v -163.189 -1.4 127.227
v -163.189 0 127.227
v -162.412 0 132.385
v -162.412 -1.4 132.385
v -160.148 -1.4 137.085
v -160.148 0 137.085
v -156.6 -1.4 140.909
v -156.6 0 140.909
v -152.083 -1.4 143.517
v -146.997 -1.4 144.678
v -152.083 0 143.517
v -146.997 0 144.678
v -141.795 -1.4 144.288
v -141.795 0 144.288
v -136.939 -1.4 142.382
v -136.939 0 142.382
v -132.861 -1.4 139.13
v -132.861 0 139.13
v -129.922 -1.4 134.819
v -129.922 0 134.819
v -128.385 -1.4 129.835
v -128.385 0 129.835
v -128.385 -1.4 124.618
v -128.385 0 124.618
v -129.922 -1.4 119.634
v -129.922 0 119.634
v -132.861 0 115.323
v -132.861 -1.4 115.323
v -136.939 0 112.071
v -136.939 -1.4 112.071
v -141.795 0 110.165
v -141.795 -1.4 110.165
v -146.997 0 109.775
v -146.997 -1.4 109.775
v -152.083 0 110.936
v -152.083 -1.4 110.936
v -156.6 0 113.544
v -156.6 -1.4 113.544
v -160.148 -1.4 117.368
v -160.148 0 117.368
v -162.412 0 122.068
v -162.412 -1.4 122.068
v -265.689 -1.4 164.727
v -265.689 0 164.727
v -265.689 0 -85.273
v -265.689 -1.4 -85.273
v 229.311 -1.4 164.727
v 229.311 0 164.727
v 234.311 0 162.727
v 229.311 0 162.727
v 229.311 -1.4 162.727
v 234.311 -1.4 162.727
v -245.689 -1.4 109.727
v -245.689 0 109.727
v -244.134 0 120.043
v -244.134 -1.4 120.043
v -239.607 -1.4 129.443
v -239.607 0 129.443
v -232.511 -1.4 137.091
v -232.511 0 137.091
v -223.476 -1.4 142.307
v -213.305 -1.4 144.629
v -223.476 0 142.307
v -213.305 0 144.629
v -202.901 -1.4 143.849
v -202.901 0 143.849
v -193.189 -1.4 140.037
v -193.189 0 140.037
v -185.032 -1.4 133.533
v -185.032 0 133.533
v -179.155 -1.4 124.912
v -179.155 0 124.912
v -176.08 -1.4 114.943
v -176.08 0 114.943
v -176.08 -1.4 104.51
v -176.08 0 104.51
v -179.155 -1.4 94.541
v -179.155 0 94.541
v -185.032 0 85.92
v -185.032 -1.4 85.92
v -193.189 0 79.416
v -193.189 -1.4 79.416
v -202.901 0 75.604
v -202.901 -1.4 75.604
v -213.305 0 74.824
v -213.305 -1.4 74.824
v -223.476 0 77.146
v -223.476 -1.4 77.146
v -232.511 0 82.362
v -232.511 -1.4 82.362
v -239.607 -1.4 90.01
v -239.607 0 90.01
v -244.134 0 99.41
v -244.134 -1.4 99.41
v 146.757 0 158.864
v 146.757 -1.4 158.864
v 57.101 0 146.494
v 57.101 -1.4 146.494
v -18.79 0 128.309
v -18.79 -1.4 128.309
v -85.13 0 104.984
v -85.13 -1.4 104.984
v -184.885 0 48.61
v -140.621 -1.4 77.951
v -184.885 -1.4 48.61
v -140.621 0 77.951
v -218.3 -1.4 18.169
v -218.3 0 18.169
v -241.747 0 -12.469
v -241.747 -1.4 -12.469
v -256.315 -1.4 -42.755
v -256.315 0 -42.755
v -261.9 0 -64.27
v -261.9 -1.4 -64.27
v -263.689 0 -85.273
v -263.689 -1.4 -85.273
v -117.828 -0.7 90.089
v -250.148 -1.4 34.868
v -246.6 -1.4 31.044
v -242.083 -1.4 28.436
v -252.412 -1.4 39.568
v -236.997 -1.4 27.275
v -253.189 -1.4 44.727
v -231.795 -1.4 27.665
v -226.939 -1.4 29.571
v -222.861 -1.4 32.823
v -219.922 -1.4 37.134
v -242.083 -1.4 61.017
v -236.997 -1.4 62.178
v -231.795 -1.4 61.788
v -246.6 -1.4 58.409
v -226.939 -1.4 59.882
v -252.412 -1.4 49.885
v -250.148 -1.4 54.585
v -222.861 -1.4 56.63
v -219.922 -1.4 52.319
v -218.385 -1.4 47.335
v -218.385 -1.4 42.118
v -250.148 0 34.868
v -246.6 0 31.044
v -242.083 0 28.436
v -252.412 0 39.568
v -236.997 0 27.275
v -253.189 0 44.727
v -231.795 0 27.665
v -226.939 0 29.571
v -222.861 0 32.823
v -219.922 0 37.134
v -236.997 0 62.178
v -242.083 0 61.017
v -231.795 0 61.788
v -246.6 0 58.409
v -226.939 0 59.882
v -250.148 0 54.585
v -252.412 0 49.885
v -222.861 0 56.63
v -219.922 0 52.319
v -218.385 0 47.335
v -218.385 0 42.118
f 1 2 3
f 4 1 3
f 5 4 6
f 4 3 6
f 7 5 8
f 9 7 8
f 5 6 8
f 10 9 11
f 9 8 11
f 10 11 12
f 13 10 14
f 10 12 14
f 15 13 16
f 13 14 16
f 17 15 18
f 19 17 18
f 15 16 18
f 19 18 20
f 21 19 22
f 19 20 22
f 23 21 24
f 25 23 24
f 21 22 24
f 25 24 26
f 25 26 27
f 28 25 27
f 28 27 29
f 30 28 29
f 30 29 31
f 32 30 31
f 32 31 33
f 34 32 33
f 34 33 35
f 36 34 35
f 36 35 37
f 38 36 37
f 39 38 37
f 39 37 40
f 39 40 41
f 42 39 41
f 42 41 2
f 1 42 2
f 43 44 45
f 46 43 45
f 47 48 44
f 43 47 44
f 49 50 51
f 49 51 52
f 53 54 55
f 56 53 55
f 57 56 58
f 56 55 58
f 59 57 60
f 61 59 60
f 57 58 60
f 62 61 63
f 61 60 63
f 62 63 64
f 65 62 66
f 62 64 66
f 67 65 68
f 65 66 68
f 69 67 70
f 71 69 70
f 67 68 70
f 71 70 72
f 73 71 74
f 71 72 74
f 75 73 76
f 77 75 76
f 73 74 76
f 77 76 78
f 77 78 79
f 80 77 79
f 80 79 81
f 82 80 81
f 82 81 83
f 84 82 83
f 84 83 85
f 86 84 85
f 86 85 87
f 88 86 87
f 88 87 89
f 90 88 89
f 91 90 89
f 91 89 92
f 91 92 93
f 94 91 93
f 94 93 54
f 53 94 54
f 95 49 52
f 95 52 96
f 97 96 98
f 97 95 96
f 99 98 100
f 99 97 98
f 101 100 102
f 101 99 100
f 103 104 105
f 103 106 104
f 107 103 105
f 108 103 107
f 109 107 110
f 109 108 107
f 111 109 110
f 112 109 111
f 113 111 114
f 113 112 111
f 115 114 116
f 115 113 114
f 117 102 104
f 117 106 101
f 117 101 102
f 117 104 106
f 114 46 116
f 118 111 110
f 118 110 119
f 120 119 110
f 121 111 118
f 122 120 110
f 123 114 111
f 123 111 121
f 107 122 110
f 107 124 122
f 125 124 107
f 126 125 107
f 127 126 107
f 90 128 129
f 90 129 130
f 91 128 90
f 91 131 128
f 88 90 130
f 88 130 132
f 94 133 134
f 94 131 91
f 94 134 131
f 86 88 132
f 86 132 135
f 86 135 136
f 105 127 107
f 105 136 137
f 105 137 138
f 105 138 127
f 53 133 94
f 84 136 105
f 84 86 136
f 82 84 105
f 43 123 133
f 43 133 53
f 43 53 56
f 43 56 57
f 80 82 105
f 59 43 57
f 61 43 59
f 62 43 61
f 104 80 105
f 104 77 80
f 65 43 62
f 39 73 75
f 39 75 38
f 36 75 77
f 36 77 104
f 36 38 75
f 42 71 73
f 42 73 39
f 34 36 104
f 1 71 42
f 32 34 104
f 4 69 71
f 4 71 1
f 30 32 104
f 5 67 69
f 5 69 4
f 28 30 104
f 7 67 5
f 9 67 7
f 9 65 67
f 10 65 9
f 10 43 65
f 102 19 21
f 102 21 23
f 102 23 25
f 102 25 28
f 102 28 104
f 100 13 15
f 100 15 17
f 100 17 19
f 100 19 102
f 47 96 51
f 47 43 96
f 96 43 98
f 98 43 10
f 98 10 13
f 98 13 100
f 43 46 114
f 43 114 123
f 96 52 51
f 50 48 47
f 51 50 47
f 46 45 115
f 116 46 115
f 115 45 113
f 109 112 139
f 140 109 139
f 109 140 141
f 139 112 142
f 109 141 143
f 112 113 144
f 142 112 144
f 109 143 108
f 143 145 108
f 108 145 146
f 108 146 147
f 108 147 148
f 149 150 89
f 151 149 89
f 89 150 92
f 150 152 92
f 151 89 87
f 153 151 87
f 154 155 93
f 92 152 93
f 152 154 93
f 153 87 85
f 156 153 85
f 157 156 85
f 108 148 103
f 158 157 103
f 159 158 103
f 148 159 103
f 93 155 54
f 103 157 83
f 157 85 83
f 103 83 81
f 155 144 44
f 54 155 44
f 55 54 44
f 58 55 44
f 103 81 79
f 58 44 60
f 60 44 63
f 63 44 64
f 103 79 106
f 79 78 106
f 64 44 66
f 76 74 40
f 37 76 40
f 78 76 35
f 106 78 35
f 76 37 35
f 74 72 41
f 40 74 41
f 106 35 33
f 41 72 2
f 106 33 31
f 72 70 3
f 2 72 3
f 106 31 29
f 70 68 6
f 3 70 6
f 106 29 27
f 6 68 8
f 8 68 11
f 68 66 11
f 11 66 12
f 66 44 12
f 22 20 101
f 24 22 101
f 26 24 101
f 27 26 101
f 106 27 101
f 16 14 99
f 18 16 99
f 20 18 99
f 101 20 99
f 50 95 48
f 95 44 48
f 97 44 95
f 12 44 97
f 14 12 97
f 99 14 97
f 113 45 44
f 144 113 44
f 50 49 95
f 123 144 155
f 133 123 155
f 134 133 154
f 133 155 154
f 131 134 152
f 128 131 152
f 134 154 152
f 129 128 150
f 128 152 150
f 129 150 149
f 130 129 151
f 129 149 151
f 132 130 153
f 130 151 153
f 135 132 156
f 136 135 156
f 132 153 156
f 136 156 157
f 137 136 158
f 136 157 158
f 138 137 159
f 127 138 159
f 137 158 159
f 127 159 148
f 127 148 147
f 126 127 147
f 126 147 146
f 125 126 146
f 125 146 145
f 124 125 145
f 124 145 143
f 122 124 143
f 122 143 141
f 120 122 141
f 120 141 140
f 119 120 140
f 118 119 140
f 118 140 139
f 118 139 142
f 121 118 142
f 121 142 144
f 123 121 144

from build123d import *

# Parameters (mm, degrees)
F1_DEPTH = 1.4
F3_D     = 70
F4_D     = 35
F5_W     = 5
F5_H     = 1.4
F6_DEPTH = 2


with BuildPart() as f1:
    # F0 (on Front) → F1 (new body)
    with BuildSketch(Plane.XZ):
        with BuildLine():
            Line((234.3109268695, 164.7265180945), (-265.6890731305, 164.7265180945))
            Line((-265.6890731305, 164.7265180945), (-265.6890731305, -85.2734819055))
            Line((-265.6890731305, -85.2734819055), (-263.6890731305, -85.2734819055))
            add(Edge.make_bspline(
                [(234.3109268695, 162.7265180945), (-263.6890731305, 162.7265180945), (-263.6890731305, -85.2734819055)],
                knots=[4.7123889804, 4.7123889804, 4.7123889804, 6.2831853072, 6.2831853072, 6.2831853072], degree=2, weights=[1, 0.7071067812, 1]))
            Line((234.3109268695, 162.7265180945), (234.3109268695, 164.7265180945))
        make_face()
    extrude(amount=F1_DEPTH)

    # F3 (through all)
    with Locations(Plane.XZ.offset(1.4)):
        with Locations((-210.6890731305, 109.7265180945)):
            Hole(F3_D / 2)

    # F4 (through all)
    with Locations(Plane.XZ.offset(1.4)):
        with Locations((-145.6890731305, 127.2265180945), (-235.6890731305, 44.7265180945)):
            Hole(F4_D / 2)

    # F5 (on face) → F6 (cut)
    with BuildSketch(Plane.XY.offset(164.7265180945)):
        Polygon((239.3109268695, -5.7), (239.3109268695, 4.3), (229.3109268695, 4.3), (229.3109268695, 0), (234.3109268695, 0), (234.3109268695, -1.4), (229.3109268695, -1.4), (229.3109268695, -5.7), align=None)
        with Locations((231.8109268695, -0.7)):
            Rectangle(F5_W, F5_H)
    extrude(amount=-F6_DEPTH, mode=Mode.SUBTRACT)


solid = f1.part
